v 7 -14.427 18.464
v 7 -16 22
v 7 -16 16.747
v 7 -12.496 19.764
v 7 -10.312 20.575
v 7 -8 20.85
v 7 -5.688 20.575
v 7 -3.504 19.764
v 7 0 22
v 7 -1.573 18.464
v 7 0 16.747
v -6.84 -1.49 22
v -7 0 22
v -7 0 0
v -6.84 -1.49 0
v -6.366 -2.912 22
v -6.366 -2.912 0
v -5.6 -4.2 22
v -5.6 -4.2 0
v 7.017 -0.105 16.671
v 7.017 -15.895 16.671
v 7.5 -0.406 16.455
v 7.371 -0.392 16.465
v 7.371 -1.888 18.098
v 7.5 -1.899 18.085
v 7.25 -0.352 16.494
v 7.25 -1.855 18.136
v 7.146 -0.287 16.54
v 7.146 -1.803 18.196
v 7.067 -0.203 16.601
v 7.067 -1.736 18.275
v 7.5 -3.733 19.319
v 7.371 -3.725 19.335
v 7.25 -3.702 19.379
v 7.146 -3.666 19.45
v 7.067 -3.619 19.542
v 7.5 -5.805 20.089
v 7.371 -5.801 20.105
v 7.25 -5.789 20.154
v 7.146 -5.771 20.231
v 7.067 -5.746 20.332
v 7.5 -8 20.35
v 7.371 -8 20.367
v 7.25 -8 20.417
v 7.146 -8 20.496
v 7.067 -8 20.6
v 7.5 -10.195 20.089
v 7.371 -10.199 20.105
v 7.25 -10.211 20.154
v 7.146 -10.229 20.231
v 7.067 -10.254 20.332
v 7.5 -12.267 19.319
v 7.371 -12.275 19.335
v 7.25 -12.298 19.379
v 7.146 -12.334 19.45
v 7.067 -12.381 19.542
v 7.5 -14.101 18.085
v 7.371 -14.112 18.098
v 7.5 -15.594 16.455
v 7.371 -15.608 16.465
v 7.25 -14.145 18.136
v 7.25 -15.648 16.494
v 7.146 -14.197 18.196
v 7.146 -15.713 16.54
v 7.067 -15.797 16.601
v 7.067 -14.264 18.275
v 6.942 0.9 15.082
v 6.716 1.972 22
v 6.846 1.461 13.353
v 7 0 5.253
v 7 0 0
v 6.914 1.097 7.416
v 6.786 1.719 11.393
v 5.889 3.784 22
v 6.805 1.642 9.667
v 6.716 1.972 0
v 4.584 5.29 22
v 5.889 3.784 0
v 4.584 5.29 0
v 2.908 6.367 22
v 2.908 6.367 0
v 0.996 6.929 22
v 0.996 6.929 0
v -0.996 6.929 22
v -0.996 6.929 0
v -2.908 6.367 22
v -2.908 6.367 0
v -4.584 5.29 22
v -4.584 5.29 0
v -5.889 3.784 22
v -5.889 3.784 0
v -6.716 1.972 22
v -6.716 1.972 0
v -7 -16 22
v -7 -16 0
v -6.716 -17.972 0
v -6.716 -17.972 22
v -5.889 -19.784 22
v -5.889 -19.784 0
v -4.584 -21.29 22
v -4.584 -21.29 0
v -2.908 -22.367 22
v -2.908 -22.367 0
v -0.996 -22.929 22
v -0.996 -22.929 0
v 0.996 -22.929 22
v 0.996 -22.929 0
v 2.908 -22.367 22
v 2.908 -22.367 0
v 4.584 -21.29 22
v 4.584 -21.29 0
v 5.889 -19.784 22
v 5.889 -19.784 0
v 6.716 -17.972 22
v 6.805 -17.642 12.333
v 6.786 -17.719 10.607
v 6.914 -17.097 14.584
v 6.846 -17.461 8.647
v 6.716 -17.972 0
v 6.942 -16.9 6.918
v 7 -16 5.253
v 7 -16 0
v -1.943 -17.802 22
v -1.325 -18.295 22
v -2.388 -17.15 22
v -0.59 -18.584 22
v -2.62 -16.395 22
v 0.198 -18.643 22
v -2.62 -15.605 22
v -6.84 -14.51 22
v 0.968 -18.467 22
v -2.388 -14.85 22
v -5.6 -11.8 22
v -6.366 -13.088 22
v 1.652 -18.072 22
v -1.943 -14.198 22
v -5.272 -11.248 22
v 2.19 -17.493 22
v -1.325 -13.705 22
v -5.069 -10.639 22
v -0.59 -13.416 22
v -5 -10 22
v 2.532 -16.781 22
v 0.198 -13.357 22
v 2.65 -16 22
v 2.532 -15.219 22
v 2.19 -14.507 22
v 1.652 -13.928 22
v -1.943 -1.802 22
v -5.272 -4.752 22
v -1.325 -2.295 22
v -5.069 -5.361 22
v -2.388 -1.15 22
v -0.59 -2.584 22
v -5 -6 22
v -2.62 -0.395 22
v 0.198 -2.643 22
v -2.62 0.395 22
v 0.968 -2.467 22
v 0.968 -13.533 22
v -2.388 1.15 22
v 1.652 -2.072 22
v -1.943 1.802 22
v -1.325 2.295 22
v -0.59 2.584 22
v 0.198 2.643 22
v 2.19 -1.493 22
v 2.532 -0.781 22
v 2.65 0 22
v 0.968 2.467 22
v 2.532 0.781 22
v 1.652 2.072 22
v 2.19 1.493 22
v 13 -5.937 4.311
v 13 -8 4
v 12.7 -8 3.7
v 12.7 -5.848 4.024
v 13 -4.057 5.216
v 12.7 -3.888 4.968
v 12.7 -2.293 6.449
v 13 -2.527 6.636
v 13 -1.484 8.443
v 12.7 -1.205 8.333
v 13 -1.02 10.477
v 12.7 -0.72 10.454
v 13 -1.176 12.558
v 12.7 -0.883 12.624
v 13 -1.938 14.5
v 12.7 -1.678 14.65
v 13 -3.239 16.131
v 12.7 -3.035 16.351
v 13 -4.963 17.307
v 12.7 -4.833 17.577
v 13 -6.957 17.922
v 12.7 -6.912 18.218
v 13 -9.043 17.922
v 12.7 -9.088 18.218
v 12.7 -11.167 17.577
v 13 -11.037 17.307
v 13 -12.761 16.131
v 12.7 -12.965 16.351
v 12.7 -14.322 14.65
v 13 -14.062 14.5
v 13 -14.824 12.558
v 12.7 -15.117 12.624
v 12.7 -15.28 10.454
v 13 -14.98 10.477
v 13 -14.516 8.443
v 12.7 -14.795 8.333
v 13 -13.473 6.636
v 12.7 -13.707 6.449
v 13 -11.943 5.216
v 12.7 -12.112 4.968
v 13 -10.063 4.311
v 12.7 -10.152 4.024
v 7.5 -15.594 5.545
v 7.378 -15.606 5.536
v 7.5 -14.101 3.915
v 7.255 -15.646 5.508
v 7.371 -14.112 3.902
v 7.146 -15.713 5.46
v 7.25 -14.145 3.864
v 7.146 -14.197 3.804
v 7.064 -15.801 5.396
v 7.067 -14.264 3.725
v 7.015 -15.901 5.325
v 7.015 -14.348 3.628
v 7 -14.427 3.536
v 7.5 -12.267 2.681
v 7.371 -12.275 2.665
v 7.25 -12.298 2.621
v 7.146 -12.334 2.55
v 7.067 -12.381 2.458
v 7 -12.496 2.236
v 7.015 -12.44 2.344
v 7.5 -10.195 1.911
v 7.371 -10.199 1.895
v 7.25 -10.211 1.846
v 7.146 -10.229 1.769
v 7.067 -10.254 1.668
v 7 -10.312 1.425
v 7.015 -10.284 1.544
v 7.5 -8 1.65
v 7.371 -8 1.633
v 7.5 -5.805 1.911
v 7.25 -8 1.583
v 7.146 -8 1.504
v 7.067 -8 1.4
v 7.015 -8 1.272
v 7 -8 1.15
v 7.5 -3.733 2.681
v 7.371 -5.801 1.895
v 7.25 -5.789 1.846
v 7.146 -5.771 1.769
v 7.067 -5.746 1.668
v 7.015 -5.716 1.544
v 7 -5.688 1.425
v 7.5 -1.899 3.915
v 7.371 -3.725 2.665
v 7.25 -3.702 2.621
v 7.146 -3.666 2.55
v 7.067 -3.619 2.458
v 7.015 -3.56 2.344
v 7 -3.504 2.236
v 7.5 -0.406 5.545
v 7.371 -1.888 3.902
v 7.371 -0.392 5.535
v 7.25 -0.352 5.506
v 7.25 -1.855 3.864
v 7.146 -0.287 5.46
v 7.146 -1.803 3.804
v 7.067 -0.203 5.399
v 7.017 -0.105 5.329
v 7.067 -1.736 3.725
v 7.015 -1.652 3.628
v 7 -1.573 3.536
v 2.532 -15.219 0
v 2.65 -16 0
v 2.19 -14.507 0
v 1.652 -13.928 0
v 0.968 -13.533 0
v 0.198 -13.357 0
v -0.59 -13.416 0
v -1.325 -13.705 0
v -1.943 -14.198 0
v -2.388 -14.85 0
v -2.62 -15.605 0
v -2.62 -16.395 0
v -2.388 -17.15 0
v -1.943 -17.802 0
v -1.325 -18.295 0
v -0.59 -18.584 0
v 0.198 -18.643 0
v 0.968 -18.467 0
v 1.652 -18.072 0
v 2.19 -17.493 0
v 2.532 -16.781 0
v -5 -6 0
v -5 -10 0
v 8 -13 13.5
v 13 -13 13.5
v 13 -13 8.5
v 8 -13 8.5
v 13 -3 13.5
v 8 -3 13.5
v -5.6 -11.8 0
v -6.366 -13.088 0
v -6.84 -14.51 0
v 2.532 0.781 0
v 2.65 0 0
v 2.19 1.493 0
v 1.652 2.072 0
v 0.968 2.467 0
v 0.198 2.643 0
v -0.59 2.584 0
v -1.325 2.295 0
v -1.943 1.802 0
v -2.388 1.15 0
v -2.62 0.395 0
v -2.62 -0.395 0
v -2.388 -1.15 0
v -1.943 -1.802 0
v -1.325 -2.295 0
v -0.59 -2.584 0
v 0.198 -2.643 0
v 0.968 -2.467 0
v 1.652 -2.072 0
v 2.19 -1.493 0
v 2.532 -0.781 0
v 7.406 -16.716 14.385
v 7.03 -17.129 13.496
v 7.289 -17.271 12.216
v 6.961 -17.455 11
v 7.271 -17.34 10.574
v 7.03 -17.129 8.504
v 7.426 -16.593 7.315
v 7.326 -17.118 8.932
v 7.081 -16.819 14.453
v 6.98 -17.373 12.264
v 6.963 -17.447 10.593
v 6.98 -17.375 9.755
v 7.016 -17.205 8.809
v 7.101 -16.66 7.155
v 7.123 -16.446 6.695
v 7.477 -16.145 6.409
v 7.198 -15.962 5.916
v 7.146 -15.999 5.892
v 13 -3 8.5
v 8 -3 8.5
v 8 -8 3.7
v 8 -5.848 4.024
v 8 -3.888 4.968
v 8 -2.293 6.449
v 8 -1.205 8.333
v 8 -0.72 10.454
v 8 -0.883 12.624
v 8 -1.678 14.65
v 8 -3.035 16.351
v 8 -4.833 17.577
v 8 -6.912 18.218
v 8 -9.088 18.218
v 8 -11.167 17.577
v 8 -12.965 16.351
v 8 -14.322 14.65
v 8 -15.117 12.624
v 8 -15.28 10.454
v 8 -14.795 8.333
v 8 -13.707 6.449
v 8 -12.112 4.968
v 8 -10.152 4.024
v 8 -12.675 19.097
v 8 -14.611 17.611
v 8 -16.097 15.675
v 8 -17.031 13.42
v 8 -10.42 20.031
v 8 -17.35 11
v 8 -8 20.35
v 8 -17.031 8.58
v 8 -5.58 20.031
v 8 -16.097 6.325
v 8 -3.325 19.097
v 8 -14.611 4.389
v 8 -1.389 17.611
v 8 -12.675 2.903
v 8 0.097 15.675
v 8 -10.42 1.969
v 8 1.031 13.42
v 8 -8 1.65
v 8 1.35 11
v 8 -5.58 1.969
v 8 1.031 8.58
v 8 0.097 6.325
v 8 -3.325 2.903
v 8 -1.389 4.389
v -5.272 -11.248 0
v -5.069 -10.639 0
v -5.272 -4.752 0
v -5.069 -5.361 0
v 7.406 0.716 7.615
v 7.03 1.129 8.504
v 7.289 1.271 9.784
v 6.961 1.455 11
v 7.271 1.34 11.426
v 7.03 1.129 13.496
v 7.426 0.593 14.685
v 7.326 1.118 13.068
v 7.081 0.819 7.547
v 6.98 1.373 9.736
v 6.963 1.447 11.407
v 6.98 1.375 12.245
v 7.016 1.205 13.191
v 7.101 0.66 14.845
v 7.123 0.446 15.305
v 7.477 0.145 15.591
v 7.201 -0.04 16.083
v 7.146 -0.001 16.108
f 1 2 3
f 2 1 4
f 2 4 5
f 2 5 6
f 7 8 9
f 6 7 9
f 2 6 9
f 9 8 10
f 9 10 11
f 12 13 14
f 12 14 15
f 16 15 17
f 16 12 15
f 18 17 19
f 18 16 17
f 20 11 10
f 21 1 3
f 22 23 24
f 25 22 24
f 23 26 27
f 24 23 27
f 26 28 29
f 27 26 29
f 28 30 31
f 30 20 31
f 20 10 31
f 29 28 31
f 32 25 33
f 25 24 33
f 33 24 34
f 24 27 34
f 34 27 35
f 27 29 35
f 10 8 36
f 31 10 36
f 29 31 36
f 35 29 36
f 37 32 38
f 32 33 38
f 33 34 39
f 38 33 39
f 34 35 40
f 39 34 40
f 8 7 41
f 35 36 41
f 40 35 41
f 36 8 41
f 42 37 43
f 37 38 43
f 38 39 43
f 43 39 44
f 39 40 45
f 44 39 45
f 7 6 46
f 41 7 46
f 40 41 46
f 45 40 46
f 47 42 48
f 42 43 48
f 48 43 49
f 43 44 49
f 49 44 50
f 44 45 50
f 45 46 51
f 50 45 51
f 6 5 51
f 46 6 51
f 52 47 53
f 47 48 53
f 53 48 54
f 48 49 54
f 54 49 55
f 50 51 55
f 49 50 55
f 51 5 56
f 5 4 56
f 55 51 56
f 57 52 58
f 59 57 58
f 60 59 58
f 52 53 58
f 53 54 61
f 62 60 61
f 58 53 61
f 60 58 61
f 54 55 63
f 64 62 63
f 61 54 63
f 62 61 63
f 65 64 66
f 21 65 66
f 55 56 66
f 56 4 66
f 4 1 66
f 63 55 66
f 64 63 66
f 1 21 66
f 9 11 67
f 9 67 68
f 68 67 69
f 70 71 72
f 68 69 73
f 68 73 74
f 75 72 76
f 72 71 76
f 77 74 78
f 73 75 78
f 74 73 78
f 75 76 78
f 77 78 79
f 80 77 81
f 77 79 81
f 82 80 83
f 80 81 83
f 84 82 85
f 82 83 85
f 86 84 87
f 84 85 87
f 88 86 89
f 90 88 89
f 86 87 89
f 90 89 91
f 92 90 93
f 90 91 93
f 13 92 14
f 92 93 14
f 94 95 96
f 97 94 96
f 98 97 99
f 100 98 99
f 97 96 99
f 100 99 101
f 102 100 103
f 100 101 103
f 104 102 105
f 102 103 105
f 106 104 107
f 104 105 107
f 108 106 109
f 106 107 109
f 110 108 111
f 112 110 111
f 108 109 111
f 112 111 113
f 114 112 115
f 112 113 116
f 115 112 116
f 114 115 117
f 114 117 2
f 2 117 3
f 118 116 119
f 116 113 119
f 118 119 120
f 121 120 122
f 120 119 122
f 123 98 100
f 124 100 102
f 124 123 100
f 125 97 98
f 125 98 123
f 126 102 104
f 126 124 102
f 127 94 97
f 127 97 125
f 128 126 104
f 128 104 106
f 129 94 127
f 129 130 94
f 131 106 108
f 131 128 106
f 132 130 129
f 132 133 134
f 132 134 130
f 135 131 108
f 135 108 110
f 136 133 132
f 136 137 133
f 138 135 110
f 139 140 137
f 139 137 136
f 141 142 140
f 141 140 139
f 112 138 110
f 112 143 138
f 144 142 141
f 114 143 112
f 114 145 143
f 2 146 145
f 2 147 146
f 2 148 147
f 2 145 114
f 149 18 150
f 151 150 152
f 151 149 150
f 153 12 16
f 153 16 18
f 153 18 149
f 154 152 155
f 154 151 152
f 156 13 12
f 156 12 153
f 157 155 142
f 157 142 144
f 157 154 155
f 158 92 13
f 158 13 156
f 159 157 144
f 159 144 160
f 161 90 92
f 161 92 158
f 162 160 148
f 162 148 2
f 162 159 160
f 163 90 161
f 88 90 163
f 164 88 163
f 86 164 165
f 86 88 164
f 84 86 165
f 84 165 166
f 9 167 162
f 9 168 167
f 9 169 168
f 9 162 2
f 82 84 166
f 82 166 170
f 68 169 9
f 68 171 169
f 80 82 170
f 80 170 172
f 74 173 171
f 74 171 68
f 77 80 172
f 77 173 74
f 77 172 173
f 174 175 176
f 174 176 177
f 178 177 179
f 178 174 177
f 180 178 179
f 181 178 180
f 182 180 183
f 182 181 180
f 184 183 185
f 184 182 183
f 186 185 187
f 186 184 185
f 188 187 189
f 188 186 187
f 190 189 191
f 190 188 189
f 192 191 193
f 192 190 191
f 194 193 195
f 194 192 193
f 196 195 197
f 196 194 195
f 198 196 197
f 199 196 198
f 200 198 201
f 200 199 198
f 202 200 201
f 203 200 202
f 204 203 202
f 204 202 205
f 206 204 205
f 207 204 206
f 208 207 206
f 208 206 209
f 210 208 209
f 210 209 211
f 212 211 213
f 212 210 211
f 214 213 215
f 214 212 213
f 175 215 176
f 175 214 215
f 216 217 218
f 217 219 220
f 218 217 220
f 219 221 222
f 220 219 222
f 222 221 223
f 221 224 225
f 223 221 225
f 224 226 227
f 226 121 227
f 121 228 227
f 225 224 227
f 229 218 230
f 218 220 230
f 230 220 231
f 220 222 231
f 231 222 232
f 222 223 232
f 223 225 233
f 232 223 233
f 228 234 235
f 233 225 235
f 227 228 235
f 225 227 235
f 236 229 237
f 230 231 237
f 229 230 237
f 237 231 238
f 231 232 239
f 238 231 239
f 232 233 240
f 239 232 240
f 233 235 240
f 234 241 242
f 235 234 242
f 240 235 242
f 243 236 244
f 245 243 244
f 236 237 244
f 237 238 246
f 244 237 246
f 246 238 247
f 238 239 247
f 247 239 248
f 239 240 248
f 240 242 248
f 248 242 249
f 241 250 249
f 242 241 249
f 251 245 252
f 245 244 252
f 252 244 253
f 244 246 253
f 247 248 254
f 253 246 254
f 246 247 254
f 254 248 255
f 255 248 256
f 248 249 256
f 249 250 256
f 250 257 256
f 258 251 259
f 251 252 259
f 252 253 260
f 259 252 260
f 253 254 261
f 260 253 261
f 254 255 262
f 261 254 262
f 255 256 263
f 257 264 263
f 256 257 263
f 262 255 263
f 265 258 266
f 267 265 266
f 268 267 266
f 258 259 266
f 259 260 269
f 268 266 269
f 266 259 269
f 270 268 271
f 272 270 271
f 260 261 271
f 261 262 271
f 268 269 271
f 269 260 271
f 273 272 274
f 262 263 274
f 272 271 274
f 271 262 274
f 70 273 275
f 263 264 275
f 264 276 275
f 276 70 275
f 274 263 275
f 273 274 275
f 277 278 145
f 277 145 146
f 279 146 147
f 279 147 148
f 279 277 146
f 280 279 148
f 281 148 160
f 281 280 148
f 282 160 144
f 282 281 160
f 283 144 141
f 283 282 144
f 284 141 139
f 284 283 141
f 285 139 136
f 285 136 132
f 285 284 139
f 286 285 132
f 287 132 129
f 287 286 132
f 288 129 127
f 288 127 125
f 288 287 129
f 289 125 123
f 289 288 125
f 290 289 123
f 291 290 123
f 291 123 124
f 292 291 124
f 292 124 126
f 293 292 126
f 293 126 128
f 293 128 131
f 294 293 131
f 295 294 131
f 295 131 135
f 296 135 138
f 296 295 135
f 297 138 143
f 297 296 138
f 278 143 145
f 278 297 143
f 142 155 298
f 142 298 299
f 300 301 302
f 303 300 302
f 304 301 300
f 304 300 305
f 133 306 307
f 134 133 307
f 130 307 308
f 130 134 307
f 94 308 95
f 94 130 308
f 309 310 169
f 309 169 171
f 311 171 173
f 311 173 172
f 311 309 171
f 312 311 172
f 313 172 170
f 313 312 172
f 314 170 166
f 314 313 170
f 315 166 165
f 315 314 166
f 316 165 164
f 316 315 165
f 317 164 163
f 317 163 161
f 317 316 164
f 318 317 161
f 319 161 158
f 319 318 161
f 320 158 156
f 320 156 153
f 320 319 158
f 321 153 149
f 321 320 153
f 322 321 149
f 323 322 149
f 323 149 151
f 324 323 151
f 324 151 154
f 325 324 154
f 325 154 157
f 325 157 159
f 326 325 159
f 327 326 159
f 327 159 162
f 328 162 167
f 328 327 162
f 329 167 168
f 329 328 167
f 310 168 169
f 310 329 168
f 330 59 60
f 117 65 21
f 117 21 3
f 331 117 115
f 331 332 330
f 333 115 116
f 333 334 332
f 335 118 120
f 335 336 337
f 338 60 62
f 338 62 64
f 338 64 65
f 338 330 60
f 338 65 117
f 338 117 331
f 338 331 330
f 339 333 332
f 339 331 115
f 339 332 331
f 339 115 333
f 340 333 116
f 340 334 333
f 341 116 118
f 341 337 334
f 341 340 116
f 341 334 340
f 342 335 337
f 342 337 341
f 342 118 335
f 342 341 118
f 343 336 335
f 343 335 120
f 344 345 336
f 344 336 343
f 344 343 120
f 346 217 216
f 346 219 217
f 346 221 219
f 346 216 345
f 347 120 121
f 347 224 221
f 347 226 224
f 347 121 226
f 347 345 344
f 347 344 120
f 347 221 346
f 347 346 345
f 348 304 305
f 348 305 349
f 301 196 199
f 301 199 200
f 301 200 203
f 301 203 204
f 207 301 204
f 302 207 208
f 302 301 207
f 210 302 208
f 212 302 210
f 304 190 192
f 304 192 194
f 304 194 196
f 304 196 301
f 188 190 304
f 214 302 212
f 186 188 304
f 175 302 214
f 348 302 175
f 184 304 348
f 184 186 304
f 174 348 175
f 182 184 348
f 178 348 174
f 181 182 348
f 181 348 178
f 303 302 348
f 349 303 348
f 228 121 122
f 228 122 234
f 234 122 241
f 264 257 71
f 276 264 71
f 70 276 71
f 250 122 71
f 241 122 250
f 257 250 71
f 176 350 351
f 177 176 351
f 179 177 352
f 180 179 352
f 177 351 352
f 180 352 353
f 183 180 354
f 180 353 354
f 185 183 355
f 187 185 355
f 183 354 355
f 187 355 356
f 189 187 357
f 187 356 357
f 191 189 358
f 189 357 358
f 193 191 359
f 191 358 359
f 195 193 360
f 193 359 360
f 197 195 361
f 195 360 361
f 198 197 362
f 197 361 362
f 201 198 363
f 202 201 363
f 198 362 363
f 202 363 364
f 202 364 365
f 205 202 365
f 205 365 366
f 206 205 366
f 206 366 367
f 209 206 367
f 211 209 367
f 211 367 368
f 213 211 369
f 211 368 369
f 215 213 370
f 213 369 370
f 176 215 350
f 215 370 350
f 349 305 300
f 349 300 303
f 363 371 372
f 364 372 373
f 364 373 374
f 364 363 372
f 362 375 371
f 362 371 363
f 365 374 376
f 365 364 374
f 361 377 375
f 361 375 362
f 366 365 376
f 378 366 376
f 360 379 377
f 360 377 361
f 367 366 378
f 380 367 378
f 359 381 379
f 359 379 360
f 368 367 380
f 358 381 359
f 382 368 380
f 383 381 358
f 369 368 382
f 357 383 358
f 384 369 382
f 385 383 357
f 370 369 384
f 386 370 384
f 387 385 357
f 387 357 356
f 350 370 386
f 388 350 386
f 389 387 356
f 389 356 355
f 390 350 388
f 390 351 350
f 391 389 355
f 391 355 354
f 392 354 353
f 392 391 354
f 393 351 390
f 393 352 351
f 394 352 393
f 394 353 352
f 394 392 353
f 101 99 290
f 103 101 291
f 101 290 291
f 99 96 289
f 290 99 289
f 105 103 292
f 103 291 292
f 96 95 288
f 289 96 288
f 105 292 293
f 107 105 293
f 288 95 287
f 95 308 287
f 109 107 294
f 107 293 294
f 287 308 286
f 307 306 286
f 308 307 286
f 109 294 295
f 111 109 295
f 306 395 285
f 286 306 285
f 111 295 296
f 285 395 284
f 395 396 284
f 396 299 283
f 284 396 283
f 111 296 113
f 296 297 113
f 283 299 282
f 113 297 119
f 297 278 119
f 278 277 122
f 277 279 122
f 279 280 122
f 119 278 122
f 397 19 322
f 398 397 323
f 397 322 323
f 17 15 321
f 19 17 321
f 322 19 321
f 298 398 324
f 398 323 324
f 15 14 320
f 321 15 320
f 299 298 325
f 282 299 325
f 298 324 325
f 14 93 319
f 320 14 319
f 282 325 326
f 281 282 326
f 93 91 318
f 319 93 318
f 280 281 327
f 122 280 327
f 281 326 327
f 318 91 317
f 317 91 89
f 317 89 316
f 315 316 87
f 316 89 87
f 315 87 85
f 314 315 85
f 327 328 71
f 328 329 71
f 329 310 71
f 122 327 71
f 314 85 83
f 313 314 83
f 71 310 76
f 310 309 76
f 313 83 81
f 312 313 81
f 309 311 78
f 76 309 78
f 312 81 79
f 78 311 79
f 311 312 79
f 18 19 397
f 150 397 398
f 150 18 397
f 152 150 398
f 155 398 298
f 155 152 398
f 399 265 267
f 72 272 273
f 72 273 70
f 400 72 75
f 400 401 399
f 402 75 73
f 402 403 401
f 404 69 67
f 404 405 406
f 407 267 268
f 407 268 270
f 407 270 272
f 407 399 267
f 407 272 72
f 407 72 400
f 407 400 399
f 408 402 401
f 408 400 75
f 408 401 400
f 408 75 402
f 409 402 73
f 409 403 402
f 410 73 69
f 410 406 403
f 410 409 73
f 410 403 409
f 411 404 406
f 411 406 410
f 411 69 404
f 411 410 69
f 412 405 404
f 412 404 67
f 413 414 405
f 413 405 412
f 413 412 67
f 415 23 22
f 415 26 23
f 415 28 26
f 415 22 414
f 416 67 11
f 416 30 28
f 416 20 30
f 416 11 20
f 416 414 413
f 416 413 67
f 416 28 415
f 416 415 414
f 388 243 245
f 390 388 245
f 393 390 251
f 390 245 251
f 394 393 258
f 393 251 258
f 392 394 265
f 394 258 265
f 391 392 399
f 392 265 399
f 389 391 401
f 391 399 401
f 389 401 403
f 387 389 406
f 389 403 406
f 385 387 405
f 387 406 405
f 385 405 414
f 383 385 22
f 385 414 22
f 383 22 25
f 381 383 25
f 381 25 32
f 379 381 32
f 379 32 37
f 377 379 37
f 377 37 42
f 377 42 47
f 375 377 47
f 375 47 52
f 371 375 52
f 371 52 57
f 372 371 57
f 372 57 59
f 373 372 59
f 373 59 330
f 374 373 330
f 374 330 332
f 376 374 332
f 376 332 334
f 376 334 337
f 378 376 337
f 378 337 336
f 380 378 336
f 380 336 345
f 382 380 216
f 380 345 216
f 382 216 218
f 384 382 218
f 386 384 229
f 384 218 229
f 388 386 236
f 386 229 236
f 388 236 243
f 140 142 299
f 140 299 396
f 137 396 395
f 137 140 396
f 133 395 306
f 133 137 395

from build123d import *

# Parameters (mm, degrees)
SKETCH_1_R           = 2.65
EXTRUDE_1_DEPTH      = 22
CUT_EXTRUDE_1_DEPTH  = 23
SKETCH_3_R           = 9.35
EXTRUDE_2_DEPTH      = 1
EXTRUDE_2_DEPTH_BACK = 1
SKETCH_4_R           = 7.3
EXTRUDE_3_DEPTH      = 5
CHAMFER_1_SIZE       = 0.3
SKETCH_5_W           = 5
SKETCH_5_H           = 10
CUT_EXTRUDE_2_DEPTH  = 5
FILLET_1_R           = 0.5


with BuildPart() as part:
    # 草图1 → 凸台-拉伸1 (new body)
    with BuildSketch(Plane.XY):
        with BuildLine():
            Line((-7, 0), (-7, -16))
            ThreePointArc((-7, -16), (0, -23), (7, -16))
            Line((7, -16), (7, 0))
            ThreePointArc((7, 0), (0, 7), (-7, 0))
        make_face()
        Circle(SKETCH_1_R, mode=Mode.SUBTRACT)
        with Locations((0, -16)):
            Circle(SKETCH_1_R, mode=Mode.SUBTRACT)
    extrude(amount=EXTRUDE_1_DEPTH)

    # 草图2 → 切除-拉伸1 (cut, through all)
    with BuildSketch(Plane.XY.offset(22)):
        with BuildLine():
            Line((-5, -6), (-5, -10))
            ThreePointArc((-5, -10), (-5.153950106, -10.948683298), (-5.6, -11.8))
            ThreePointArc((-5.6, -11.8), (-6.640783086, -13.786405638), (-7, -16))
            Line((-7, -16), (-7, 0))
            ThreePointArc((-7, 0), (-6.640783086, -2.213594362), (-5.6, -4.2))
            ThreePointArc((-5.6, -4.2), (-5.153950106, -5.051316702), (-5, -6))
        make_face()
    extrude(amount=-CUT_EXTRUDE_1_DEPTH, mode=Mode.SUBTRACT)

    # 草图3 → 凸台-拉伸2 (add, two sides)
    with BuildSketch(Plane(origin=(7, 0, 0), x_dir=(0, 0, -1), z_dir=(1, 0, 0))) as extrude_2_sk:
        with Locations((-11, -8)):
            Circle(SKETCH_3_R)
    extrude(amount=EXTRUDE_2_DEPTH)
    extrude(extrude_2_sk.sketch, amount=-EXTRUDE_2_DEPTH_BACK)

    # 草图4 → 凸台-拉伸3 (add)
    with BuildSketch(Plane(origin=(8, 0, 0), x_dir=(0, 0, -1), z_dir=(1, 0, 0))):
        with Locations((-11, -8)):
            Circle(SKETCH_4_R)
    extrude(amount=EXTRUDE_3_DEPTH)

    # 倒角1
    chamfer_1_edges = [part.edges().sort_by_distance(p)[0] for p in [
        (13, -8, 18.3),
    ]]
    chamfer(chamfer_1_edges, length=CHAMFER_1_SIZE)

    # 草图5 → 切除-拉伸2 (cut)
    with BuildSketch(Plane(origin=(13, 0, 0), x_dir=(0, 0, -1), z_dir=(1, 0, 0))):
        with Locations((-11, -8)):
            Rectangle(SKETCH_5_W, SKETCH_5_H)
    extrude(amount=-CUT_EXTRUDE_2_DEPTH, mode=Mode.SUBTRACT)

    # 圆角1
    fillet_1_edges = [part.edges().sort_by_distance(p)[0] for p in [
        (7, -8, 20.35),
        (-7, -16, 11),
        (7, -3.408078049, 2.855262264),
        (6.868587919, 1.35, 11),
    ]]
    fillet(fillet_1_edges, radius=FILLET_1_R)


solid = part.part
